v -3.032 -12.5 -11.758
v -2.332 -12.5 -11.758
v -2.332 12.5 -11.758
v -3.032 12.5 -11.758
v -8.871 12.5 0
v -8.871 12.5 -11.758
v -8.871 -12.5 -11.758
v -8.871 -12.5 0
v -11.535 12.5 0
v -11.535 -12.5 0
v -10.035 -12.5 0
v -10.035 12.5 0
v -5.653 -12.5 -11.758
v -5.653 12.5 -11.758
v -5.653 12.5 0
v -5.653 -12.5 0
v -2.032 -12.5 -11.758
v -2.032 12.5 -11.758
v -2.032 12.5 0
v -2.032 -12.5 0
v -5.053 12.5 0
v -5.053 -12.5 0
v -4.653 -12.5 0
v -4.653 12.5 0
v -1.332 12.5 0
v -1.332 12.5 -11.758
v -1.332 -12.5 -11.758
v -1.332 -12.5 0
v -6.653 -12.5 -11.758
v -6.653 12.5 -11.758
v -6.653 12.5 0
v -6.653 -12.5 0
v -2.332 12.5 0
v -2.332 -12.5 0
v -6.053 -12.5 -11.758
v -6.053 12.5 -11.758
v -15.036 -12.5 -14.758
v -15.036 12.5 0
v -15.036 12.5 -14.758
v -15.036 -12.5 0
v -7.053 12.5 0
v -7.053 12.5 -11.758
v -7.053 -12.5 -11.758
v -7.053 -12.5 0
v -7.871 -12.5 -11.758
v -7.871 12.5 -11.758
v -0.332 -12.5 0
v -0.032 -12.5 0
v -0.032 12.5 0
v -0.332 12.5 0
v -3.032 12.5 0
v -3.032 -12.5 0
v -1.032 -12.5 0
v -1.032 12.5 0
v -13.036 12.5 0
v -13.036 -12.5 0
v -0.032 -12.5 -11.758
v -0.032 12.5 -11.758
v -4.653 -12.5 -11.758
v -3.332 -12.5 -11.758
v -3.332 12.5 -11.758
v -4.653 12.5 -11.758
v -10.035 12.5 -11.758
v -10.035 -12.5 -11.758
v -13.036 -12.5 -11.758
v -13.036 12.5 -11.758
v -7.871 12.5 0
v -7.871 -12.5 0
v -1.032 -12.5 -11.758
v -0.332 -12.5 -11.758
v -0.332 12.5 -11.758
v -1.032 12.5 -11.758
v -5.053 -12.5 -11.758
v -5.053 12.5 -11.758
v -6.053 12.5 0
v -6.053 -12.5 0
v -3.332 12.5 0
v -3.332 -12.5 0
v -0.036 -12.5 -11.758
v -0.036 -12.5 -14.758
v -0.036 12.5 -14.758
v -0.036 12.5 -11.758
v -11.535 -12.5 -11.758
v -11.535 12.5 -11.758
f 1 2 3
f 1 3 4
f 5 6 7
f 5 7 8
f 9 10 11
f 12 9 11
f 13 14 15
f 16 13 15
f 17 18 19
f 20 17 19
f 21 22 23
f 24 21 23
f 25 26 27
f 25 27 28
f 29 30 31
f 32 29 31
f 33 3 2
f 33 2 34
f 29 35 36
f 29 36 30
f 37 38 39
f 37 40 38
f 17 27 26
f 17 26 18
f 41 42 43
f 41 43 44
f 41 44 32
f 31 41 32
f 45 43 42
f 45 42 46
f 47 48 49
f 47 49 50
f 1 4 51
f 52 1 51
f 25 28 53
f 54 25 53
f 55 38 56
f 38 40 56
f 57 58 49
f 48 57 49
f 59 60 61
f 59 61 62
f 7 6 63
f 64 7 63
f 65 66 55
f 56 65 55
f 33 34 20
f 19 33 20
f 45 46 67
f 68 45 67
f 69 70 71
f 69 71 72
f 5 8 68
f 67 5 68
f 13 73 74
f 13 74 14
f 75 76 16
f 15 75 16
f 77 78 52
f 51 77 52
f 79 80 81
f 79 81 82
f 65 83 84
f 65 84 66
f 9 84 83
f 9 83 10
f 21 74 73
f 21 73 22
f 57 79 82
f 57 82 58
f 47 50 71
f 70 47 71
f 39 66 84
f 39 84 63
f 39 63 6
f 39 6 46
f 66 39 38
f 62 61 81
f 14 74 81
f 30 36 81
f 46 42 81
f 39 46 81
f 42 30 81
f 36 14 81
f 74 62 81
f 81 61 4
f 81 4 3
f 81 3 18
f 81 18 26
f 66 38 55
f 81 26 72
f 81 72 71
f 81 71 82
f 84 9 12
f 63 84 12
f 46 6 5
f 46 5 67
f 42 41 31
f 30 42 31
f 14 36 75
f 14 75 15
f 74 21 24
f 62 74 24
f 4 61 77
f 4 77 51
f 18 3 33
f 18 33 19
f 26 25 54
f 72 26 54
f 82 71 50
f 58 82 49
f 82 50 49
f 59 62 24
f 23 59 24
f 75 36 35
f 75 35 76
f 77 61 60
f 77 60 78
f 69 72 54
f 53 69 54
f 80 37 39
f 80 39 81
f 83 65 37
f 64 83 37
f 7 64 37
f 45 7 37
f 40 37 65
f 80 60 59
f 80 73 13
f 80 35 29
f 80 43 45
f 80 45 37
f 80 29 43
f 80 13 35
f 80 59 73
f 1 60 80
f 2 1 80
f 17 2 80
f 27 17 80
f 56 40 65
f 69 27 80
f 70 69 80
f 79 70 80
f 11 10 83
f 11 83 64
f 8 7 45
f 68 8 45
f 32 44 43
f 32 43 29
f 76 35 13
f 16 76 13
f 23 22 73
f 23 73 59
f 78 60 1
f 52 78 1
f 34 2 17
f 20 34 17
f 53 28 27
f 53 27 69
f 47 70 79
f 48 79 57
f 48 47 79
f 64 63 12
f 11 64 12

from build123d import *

# Parameters (mm, degrees)
F0_W     = 5.08
F0_H     = 25.4
F0_W_2   = 2.54
F0_W_3   = 3.81
F1_DEPTH = 40
F3_W     = 2
F3_H     = 11.758205078
F3_W_2   = 1.5
F3_W_3   = 1
F3_W_4   = 0.3
F3_W_5   = 0.4
F4_DEPTH = 12.5


with BuildPart() as f1:
    # F0 (on Front) → F1 (new body)
    with BuildSketch(Plane.XZ):
        Polygon((-39.5374095005, -17.8057016992), (-44.6174095005, -17.8057016992), (-44.6174095005, -22.8857016992), (56.9825904995, -22.8857016992), (56.9825904995, -17.8057016992), (51.9025904995, -17.8057016992), (40.6538585508, -17.8057016992), (38.1138585508, -17.8057016992), (25.9218535846, -17.8057016992), (22.1118535846, -17.8057016992), (8.1349273361, -17.8057016992), (3.0549273361, -17.8057016992), (-17.8261825508, -17.8057016992), (-20.3661825508, -17.8057016992), (-27.4666358256, -17.8057016992), (-31.2766358256, -17.8057016992), align=None)
        with Locations((54.4425904995, -5.1057016992)):
            Rectangle(F0_W, F0_H)
        with Locations((39.3838585508, -5.1057016992)):
            Rectangle(F0_W_2, F0_H)
        with Locations((24.0168535846, -5.1057016992)):
            Rectangle(F0_W_3, F0_H)
        with Locations((5.5949273361, -5.1057016992)):
            Rectangle(F0_W, F0_H)
        with Locations((-29.3716358256, -5.1057016992)):
            Rectangle(F0_W_3, F0_H)
        with Locations((-42.0774095005, -5.1057016992)):
            Rectangle(F0_W, F0_H)
        with Locations((-19.0961825508, -5.1057016992)):
            Rectangle(F0_W_2, F0_H)
    extrude(amount=F1_DEPTH)


with BuildPart() as f4:
    # F3 (on Front) → F4 (new body, symmetric)
    with BuildSketch(Plane.XZ):
        with Locations((-14.0355701865, -5.879102539)):
            Rectangle(F3_W, F3_H)
        Polygon((-13.0355701865, -11.758205078), (-15.0355701865, -11.758205078), (-15.0355701865, -14.758205078), (-0.0355701865, -14.758205078), (-0.0355701865, -11.758205078), (-0.3316470217, -11.758205078), (-1.0316470217, -11.758205078), (-1.3316470217, -11.758205078), (-2.0316470217, -11.758205078), (-2.3316470217, -11.758205078), (-3.0316470217, -11.758205078), (-3.3316470217, -11.758205078), (-4.6532104, -11.758205078), (-5.0532104, -11.758205078), (-5.6532104, -11.758205078), (-6.0532104, -11.758205078), (-6.6532104, -11.758205078), (-7.0532104, -11.758205078), (-7.870703689, -11.758205078), (-8.870703689, -11.758205078), (-10.0352638757, -11.758205078), (-11.5352638757, -11.758205078), align=None)
        with Locations((-10.7852638757, -5.879102539)):
            Rectangle(F3_W_2, F3_H)
        Polygon((-0.3316470217, -11.758205078), (-0.0355701865, -11.758205078), (-0.0316470217, -11.758205078), (-0.0316470217, 0), (-0.3316470217, 0), align=None)
        with Locations((-8.370703689, -5.879102539)):
            Rectangle(F3_W_3, F3_H)
        with Locations((-1.1816470217, -5.879102539)):
            Rectangle(F3_W_4, F3_H)
        with Locations((-6.8532104, -5.879102539)):
            Rectangle(F3_W_5, F3_H)
        with Locations((-2.1816470217, -5.879102539)):
            Rectangle(F3_W_4, F3_H)
        with Locations((-5.8532104, -5.879102539)):
            Rectangle(F3_W_5, F3_H)
        with Locations((-3.1816470217, -5.879102539)):
            Rectangle(F3_W_4, F3_H)
        with Locations((-4.8532104, -5.879102539)):
            Rectangle(F3_W_5, F3_H)
    extrude(amount=F4_DEPTH, both=True)


solid = f4.part
